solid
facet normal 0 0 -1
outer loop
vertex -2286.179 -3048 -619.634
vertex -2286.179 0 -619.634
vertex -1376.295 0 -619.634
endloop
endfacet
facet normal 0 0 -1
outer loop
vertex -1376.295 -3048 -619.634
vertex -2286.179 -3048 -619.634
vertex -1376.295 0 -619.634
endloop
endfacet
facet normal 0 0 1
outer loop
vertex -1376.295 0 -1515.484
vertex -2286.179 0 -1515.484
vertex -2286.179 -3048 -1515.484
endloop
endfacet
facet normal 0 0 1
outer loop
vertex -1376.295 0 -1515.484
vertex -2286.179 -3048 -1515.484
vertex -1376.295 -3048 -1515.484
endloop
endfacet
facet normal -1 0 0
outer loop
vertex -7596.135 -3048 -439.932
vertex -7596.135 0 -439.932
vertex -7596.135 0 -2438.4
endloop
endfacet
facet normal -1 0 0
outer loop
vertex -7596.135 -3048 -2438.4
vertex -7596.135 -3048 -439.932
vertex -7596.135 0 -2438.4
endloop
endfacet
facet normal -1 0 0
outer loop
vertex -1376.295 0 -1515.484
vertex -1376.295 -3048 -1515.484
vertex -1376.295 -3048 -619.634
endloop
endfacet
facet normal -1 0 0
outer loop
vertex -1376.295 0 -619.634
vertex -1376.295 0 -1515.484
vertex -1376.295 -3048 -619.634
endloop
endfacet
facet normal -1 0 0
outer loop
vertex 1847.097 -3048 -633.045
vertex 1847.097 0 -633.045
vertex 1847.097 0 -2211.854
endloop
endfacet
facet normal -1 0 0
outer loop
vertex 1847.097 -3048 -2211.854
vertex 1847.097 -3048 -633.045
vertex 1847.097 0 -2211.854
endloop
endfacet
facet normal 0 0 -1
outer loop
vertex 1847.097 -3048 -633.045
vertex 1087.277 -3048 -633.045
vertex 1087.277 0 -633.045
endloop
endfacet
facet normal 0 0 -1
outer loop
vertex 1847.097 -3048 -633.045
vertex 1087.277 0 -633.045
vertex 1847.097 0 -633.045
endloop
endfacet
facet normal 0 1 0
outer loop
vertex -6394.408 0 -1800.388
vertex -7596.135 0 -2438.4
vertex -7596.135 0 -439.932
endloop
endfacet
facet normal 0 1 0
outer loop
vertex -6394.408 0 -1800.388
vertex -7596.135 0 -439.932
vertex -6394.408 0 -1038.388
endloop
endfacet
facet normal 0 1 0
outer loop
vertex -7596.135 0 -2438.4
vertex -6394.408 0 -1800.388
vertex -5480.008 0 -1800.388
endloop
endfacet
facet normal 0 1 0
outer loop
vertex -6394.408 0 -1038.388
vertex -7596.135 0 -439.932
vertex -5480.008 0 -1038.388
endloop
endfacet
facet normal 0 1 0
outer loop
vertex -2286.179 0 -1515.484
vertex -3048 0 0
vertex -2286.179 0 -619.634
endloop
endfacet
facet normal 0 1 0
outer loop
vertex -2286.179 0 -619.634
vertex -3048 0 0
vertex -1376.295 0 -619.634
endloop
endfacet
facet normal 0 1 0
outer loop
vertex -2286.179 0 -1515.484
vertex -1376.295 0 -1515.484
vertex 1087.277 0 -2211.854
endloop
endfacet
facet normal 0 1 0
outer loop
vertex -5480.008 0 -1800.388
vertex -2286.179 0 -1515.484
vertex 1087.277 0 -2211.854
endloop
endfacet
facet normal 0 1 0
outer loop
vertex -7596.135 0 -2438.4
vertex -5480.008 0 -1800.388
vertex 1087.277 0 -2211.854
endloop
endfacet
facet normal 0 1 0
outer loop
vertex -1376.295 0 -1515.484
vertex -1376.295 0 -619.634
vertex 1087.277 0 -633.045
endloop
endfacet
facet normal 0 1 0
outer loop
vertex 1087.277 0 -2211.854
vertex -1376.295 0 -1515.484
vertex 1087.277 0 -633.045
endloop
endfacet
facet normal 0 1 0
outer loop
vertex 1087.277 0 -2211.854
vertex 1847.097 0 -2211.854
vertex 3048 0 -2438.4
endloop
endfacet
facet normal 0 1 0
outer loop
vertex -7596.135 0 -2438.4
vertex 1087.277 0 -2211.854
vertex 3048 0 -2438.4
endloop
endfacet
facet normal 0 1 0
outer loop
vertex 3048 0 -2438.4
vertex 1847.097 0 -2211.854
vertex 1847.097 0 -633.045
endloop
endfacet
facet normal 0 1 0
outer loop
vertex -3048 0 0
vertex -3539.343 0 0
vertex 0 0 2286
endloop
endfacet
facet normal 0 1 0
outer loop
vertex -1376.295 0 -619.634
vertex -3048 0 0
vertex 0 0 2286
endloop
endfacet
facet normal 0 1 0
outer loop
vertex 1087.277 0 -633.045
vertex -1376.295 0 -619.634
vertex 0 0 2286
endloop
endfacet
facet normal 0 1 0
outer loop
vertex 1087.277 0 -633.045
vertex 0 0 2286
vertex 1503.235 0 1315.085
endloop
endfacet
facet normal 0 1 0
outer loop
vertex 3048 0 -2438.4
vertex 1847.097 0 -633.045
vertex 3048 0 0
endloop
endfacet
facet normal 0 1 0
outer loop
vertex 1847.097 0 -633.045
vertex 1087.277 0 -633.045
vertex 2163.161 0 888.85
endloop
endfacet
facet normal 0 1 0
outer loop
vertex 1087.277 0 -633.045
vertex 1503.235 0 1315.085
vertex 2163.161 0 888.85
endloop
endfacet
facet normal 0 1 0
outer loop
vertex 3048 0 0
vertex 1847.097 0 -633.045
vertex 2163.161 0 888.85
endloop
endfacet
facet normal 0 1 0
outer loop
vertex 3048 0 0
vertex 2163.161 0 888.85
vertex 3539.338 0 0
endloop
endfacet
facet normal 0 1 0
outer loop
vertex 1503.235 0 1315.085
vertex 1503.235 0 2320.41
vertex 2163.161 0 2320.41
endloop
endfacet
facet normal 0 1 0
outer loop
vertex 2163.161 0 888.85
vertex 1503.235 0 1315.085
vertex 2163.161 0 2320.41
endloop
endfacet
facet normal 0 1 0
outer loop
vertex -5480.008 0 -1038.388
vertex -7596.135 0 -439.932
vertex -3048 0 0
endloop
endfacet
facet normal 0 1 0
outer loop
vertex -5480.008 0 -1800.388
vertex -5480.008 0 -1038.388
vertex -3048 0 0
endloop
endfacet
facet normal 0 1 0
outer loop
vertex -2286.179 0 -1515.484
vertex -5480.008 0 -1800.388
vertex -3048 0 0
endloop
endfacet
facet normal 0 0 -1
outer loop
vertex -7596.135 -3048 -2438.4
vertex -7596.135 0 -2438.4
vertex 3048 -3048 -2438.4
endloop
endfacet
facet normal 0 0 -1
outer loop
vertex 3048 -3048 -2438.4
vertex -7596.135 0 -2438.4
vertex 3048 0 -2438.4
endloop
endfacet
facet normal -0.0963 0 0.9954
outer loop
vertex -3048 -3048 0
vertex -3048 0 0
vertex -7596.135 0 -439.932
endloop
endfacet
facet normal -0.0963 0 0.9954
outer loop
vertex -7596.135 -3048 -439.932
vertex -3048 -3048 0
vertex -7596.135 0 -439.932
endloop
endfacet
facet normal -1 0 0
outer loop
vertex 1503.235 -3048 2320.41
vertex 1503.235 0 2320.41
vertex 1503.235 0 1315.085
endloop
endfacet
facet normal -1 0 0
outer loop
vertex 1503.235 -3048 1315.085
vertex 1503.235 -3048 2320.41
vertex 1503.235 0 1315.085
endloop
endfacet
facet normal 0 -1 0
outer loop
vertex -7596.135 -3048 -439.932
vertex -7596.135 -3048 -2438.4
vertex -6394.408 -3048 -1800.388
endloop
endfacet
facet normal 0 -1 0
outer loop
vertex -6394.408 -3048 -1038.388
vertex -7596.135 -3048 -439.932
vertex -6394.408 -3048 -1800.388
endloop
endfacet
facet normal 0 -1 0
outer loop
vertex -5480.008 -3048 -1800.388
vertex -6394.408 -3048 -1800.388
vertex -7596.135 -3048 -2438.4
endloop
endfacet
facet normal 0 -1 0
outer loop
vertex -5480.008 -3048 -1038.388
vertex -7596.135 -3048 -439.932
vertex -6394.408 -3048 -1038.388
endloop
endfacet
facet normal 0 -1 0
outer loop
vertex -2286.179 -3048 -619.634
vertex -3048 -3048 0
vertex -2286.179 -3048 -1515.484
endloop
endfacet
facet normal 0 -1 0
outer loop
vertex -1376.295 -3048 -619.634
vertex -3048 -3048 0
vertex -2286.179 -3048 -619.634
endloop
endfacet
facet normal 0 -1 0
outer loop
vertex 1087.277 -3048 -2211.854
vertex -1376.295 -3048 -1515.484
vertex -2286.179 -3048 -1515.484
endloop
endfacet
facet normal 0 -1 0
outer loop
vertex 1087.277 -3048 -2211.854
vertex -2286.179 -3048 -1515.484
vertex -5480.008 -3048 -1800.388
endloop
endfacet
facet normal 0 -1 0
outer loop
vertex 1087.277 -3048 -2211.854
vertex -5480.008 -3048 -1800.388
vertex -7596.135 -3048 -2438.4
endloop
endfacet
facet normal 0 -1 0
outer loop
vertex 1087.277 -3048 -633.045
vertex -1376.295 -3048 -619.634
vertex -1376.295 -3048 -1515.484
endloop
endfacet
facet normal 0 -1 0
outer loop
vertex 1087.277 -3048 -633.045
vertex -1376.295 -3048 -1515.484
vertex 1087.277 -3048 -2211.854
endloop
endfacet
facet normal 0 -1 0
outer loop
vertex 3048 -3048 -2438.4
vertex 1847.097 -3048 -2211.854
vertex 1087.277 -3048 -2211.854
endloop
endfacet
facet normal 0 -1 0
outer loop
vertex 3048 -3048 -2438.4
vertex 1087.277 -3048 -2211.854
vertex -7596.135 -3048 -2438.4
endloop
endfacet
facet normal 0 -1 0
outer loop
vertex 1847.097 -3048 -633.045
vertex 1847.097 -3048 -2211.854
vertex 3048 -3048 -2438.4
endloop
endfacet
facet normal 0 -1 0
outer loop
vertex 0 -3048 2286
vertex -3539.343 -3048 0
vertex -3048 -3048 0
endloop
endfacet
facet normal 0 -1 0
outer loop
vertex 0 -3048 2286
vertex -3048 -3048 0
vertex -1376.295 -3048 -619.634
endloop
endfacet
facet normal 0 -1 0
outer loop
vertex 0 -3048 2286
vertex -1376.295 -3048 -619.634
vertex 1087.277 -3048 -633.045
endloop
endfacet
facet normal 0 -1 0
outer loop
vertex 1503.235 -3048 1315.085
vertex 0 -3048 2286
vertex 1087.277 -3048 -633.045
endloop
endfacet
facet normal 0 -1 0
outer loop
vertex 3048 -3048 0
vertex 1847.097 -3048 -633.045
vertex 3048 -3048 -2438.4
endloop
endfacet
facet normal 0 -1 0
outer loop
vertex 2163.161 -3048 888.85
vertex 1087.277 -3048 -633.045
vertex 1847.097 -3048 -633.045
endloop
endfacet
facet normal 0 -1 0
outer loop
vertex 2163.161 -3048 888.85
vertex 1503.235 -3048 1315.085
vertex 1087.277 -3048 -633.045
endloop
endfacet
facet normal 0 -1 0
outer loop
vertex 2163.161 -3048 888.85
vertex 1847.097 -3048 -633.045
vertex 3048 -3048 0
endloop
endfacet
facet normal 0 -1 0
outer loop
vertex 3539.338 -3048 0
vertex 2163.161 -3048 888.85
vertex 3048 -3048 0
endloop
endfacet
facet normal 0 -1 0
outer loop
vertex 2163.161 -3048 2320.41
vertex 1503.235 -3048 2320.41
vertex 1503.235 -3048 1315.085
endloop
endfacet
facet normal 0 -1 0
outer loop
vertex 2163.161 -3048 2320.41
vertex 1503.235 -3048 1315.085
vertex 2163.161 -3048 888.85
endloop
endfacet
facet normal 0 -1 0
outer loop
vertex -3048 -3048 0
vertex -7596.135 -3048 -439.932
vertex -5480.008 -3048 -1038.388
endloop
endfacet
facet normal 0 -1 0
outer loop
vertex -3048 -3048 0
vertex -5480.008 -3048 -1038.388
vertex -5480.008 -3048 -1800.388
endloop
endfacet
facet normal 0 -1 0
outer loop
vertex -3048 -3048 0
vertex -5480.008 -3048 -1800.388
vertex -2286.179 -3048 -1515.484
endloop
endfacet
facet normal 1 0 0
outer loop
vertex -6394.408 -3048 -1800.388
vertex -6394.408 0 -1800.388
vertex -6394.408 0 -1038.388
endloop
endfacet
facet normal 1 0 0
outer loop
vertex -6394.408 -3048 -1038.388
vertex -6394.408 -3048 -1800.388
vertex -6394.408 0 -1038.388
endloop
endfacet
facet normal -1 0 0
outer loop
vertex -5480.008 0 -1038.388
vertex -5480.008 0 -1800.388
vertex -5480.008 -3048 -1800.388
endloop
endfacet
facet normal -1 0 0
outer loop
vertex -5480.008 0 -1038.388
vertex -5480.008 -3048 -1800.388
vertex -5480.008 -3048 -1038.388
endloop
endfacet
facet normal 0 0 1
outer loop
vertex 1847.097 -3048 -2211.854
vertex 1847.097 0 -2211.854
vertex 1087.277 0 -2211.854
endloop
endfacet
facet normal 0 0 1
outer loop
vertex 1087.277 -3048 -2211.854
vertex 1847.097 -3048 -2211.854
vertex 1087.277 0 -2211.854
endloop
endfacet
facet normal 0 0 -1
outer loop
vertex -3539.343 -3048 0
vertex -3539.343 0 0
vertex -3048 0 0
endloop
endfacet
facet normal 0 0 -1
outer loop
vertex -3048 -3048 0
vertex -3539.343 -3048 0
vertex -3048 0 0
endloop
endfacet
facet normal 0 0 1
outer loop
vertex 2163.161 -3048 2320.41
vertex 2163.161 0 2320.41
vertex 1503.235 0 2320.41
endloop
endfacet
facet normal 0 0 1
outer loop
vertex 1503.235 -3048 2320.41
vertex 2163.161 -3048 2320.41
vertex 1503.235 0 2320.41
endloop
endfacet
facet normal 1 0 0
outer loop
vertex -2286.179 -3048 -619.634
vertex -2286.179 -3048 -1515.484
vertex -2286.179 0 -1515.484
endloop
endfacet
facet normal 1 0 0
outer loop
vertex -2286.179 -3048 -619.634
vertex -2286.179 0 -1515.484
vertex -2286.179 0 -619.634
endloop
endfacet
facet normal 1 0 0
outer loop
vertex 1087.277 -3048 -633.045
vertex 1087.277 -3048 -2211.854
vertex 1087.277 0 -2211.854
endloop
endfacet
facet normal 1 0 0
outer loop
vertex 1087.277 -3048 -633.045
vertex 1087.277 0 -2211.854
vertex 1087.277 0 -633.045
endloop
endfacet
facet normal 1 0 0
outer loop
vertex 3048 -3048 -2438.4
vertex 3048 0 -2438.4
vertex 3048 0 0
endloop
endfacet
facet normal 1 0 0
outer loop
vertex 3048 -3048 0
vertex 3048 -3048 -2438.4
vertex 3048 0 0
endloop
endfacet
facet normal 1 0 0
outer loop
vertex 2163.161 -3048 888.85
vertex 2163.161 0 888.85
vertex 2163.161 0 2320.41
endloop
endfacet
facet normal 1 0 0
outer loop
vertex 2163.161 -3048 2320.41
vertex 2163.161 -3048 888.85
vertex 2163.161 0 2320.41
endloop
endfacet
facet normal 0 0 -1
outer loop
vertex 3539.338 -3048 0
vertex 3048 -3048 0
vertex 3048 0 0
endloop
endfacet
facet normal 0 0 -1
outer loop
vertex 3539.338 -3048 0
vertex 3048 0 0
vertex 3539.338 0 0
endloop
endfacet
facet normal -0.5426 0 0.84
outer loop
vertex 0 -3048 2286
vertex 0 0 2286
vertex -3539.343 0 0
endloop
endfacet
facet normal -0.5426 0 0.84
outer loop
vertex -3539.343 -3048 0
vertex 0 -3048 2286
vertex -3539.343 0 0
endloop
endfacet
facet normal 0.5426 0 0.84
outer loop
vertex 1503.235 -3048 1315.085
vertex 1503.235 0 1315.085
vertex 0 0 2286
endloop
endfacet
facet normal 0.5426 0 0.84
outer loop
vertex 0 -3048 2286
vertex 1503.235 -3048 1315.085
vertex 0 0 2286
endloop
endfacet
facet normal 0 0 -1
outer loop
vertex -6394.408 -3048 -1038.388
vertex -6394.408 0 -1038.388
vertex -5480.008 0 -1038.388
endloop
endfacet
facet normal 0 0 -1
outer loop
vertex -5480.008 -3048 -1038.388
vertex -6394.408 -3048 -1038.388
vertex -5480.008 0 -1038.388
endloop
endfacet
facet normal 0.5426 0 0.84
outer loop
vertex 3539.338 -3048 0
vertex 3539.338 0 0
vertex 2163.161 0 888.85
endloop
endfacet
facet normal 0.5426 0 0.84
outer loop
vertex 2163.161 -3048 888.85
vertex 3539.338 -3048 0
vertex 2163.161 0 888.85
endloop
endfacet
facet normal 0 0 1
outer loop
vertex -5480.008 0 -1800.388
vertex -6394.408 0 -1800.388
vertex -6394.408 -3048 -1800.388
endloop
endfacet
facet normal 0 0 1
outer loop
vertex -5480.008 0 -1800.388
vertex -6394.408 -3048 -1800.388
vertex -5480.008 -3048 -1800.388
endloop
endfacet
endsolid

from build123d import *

# Parameters (mm, degrees)
F0_W     = 909.884095192
F0_H     = 895.8497047424
F0_W_2   = 914.4
F0_H_2   = 762
F0_W_3   = 4548.1346626282
F0_H_3   = 226.5457805634
F1_DEPTH = 3048


with BuildPart() as f1:
    # F0 (on Front) → F1 (new body)
    with BuildSketch(Plane.XZ):
        Polygon((3048, 0), (0, 0), (-3048, 0), (-3048, -265.2795314789), (-3048, -2211.8542194366), (1087.2766971588, -2211.8542194366), (1087.2766971588, -633.0450773239), (1847.0970392227, -633.0450773239), (1847.0970392227, -2211.8542194366), (3048, -2211.8542194366), align=None)
        with Locations((-1831.2367796898, -1067.5588846207)):
            Rectangle(F0_W, F0_H, mode=Mode.SUBTRACT)
        Polygon((0, 1981.2), (0, 0), (3048, 0), align=None)
        Polygon((-3048, 0), (0, 0), (0, 1981.2), align=None)
        Polygon((-3539.3431186676, 0), (-3048, 0), (0, 1981.2), (0, 2286), align=None)
        Polygon((-3048, -265.2795314789), (-3048, 0), (-7596.1346626282, -439.9324449932), (-7596.1346626282, -705.2119764721), align=None)
        Polygon((0, 1981.2), (3048, 0), (3539.3376, 0), (2163.161277771, 888.849674192), (1503.2346424968, 1315.0854444776), (0, 2286), align=None)
        Polygon((-3048, -2211.8542194366), (-3048, -265.2795314789), (-7596.1346626282, -705.2119764721), (-7596.1346626282, -2211.8542194366), align=None)
        with Locations((-5937.207749176, -1419.3884553909)):
            Rectangle(F0_W_2, F0_H_2, mode=Mode.SUBTRACT)
        Polygon((3048, -2438.4), (3048, -2211.8542194366), (1847.0970392227, -2211.8542194366), (1773.0509563446, -2211.8542194366), (1163.4509563446, -2211.8542194366), (1087.2766971588, -2211.8542194366), (-3048, -2211.8542194366), (-3048, -2438.4), align=None)
        with Locations((-5322.0673313141, -2325.1271097183)):
            Rectangle(F0_W_3, F0_H_3)
        Polygon((1503.2346424968, 1315.0854444776), (2163.161277771, 888.849674192), (2163.161277771, 2320.4097747803), (1503.2346424968, 2320.4097747803), align=None)
    extrude(amount=F1_DEPTH)


solid = f1.part
